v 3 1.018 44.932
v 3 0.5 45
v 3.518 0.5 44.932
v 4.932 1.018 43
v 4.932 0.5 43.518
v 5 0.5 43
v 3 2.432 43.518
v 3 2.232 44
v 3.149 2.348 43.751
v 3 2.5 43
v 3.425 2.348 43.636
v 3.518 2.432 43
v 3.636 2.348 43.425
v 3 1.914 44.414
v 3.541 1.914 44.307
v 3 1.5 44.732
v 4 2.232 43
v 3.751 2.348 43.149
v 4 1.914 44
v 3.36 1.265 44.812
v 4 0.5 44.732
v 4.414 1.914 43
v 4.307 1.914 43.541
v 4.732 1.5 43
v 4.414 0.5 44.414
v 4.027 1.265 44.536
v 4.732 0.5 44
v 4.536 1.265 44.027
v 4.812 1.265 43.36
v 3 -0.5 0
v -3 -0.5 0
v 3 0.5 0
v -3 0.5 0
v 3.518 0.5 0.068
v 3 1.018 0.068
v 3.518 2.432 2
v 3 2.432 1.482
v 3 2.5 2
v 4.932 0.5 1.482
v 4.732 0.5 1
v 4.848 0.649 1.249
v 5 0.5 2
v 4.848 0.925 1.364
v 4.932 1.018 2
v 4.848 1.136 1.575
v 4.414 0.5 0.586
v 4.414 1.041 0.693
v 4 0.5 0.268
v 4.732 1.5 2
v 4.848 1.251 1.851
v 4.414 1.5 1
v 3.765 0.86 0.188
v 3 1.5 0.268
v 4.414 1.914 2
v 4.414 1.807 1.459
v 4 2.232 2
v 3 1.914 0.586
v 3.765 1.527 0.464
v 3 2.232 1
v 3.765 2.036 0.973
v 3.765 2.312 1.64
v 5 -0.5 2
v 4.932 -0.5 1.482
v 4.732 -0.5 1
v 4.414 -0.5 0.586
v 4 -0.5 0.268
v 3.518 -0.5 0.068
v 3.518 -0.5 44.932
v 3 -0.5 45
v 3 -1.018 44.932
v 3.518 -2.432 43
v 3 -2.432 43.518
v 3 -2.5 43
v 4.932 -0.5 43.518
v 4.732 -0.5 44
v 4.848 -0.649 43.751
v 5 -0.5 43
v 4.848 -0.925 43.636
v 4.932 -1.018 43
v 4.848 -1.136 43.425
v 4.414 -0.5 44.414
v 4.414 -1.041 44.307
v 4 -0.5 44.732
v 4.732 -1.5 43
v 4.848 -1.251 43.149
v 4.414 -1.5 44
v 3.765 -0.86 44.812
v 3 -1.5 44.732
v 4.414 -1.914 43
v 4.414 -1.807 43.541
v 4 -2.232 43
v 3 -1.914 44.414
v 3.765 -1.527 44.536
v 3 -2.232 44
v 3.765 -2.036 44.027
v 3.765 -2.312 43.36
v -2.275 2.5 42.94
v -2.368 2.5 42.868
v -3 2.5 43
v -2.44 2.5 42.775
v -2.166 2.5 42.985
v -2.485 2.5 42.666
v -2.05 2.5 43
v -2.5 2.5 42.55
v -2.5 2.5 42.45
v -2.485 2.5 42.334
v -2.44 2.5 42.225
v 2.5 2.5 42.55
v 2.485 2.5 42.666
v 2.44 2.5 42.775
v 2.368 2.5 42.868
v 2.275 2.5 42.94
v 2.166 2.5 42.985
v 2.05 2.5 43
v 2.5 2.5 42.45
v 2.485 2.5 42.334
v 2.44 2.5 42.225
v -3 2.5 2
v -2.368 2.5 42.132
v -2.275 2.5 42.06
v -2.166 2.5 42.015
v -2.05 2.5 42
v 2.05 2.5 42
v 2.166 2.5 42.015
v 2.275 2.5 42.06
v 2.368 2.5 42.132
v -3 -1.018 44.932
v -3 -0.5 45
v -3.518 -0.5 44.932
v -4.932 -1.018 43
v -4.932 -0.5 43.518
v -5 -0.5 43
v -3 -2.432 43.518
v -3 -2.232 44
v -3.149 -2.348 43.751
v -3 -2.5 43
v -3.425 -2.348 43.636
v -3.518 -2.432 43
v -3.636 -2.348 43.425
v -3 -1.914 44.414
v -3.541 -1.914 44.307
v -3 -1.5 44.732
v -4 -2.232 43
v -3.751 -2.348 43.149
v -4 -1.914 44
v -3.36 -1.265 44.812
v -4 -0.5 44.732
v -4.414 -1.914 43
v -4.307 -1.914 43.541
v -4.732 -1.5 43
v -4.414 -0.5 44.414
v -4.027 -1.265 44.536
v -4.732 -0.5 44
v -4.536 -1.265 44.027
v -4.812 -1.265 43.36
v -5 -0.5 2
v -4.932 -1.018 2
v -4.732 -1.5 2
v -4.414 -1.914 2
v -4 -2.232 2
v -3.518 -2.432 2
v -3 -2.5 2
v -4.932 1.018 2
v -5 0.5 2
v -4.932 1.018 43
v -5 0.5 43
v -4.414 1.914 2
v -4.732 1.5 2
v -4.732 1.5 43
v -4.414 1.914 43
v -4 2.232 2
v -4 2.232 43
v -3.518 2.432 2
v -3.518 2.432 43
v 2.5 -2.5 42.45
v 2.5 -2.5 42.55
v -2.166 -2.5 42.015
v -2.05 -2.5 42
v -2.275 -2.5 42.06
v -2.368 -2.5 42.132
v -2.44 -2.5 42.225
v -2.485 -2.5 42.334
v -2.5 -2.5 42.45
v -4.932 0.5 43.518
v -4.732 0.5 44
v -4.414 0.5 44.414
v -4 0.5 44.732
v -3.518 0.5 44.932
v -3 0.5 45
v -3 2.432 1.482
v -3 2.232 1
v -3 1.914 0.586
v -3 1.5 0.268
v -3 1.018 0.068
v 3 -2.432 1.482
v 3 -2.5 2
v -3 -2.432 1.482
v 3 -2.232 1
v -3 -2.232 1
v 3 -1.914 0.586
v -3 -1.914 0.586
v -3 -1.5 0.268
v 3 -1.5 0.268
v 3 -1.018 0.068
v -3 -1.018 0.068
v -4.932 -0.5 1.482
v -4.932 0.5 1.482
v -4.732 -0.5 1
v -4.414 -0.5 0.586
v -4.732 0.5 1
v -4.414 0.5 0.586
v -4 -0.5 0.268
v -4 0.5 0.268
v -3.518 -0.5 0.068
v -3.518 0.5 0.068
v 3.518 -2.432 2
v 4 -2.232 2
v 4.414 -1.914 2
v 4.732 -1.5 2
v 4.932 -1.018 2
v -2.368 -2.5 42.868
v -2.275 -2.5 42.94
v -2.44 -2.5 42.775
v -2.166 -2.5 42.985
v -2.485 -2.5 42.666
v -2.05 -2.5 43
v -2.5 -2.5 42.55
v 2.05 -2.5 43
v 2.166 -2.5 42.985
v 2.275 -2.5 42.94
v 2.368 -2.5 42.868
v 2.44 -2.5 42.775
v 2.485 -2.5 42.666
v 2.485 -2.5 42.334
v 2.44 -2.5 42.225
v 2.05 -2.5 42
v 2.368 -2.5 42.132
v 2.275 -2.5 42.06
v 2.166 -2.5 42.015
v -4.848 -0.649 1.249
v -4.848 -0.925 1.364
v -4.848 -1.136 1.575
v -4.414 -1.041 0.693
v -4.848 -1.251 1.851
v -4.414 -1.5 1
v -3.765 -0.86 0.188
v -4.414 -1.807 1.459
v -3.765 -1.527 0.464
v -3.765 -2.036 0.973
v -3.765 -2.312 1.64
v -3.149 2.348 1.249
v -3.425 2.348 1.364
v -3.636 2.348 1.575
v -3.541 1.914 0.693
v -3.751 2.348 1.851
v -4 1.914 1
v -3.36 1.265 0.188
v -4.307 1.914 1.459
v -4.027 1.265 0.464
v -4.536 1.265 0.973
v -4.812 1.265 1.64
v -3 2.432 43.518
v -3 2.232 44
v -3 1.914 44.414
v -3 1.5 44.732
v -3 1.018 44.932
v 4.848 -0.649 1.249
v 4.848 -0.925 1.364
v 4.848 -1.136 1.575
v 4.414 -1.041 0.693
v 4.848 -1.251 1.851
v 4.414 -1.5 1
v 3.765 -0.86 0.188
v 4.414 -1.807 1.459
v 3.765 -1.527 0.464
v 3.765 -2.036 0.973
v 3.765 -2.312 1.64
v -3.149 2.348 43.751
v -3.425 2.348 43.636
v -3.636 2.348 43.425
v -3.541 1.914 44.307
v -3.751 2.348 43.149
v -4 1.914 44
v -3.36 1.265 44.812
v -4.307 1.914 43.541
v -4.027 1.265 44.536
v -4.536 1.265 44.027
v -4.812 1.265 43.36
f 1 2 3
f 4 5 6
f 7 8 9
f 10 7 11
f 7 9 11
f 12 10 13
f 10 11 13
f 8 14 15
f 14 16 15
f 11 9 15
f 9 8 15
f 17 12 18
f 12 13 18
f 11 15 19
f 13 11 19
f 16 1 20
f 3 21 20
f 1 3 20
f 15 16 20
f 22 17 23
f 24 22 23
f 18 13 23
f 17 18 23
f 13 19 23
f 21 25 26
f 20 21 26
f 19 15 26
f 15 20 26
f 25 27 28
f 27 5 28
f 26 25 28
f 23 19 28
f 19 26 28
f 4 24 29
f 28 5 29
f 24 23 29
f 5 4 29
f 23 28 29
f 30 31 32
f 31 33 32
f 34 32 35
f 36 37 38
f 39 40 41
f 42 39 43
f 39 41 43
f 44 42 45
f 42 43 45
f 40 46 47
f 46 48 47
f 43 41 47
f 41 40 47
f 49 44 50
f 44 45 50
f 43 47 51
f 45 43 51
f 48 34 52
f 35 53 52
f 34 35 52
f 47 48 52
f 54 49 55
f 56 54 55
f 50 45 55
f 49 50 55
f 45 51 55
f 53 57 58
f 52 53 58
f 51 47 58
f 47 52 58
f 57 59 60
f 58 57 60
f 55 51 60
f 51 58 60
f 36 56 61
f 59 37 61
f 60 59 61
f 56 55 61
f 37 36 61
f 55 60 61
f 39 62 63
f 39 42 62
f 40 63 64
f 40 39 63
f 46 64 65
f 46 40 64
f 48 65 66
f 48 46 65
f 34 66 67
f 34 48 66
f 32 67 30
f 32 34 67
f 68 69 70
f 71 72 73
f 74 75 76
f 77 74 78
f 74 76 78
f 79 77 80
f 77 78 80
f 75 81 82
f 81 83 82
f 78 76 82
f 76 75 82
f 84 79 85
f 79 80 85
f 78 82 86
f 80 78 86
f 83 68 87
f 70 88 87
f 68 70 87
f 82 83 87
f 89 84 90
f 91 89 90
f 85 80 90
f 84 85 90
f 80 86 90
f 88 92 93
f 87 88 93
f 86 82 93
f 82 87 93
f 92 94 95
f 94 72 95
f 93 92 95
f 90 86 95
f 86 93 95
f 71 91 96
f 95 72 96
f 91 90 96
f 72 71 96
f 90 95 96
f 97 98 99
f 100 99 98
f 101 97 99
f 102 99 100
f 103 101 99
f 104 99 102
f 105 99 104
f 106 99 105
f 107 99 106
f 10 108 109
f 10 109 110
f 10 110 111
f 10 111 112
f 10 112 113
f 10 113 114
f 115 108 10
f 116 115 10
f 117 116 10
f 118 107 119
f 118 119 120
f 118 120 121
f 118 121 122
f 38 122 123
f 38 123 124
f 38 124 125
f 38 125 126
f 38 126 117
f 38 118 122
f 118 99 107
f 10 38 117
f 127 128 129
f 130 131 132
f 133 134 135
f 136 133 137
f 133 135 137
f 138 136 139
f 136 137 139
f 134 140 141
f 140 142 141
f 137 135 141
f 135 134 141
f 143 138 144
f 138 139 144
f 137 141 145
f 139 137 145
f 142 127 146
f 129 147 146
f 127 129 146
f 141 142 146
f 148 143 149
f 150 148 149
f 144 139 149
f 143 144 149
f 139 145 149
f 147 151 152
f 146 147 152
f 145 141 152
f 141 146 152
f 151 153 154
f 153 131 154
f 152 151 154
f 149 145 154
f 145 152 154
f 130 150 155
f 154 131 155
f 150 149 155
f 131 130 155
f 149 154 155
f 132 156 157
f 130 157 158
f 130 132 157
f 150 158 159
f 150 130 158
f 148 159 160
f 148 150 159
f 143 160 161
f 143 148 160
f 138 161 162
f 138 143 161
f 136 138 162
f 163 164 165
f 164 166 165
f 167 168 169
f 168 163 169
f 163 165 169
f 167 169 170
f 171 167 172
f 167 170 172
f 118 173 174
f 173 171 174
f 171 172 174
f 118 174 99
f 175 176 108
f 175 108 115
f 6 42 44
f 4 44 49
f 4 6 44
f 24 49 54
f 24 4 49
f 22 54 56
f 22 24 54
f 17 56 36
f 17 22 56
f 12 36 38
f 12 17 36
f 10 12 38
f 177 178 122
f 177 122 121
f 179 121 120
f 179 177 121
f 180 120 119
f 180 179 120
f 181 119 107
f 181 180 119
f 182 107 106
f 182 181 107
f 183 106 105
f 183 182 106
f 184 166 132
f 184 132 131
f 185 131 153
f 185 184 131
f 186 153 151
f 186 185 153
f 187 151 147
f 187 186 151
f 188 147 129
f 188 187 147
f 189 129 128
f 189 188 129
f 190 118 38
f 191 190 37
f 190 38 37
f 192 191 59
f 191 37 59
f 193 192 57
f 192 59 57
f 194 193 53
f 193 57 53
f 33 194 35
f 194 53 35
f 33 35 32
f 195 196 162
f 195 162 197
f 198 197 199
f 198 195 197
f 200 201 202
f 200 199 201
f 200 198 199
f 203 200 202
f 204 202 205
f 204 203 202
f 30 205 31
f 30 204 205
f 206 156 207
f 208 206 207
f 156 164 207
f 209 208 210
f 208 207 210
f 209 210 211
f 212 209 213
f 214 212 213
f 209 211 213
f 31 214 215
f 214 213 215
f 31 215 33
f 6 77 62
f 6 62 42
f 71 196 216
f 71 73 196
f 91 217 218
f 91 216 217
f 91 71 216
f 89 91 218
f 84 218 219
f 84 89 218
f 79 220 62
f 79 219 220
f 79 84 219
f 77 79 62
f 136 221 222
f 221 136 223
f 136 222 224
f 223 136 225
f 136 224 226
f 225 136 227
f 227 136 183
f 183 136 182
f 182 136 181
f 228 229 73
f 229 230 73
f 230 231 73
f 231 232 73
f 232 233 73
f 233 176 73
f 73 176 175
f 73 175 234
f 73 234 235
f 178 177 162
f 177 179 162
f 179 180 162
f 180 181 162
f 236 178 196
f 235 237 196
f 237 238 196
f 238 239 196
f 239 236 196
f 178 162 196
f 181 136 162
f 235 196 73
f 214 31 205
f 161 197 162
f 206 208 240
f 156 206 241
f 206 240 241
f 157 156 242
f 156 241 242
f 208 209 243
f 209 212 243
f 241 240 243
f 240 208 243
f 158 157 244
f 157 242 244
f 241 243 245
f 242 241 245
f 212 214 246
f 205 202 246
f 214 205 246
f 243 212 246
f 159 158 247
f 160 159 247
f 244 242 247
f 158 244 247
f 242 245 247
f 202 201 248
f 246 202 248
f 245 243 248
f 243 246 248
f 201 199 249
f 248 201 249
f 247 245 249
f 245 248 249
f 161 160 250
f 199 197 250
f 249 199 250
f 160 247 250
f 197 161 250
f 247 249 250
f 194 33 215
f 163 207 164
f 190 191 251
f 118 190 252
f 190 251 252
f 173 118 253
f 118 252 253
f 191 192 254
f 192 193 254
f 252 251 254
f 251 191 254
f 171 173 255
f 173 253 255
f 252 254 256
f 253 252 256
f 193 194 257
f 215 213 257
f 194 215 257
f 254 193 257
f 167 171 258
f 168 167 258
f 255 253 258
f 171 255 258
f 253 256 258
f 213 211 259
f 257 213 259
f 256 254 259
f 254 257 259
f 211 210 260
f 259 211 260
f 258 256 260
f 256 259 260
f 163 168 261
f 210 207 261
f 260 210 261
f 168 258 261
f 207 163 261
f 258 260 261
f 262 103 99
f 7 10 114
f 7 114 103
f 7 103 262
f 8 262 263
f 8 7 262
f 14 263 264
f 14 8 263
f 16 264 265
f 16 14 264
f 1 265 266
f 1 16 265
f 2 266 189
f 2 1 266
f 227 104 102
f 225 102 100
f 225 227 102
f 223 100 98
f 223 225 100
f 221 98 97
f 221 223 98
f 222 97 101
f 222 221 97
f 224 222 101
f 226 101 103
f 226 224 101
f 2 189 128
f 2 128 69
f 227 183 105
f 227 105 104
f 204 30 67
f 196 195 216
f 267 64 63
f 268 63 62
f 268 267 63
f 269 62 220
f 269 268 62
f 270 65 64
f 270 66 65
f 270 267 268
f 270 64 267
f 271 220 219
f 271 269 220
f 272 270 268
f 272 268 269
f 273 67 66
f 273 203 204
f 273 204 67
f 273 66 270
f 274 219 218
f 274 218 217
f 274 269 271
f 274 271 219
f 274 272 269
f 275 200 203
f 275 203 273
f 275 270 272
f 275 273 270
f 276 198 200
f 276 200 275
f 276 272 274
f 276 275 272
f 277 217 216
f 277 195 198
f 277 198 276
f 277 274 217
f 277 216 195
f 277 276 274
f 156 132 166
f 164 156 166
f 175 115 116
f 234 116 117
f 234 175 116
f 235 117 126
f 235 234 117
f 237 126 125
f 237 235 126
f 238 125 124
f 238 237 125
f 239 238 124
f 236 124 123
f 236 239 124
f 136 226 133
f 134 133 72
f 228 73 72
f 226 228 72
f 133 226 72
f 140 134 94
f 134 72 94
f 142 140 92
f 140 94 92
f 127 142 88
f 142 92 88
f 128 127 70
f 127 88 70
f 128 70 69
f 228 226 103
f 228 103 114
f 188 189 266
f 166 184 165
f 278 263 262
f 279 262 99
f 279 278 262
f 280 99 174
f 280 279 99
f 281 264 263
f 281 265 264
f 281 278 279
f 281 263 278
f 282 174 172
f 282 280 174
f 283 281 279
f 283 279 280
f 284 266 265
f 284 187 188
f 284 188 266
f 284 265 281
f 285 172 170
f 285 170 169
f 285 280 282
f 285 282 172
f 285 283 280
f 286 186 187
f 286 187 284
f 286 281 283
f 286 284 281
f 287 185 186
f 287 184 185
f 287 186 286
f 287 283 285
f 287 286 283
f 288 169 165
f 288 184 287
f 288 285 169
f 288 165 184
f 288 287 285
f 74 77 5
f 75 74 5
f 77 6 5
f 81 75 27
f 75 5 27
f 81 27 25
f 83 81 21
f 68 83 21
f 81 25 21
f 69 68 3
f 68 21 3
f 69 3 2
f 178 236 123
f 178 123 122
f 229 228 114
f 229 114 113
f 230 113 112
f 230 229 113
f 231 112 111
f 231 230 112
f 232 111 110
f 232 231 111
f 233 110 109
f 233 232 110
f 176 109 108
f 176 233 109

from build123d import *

# Parameters (mm, degrees)
SKETCH1_W           = 10
SKETCH1_H           = 5
BOSS_EXTRUDE1_DEPTH = 45
FILLET1_R           = 2
CUT_EXTRUDE1_DEPTH  = 10


with BuildPart() as part:
    # Sketch1 → Boss-Extrude1 (new body)
    with BuildSketch(Plane.XY):
        Rectangle(SKETCH1_W, SKETCH1_H)
    extrude(amount=BOSS_EXTRUDE1_DEPTH)

    # Fillet1
    fillet1_edges = [part.edges().sort_by_distance(p)[0] for p in [
        (-5, 0, 45),
        (0, -2.5, 45),
        (5, 0, 45),
        (0, -2.5, 0),
        (-5, 0, 0),
        (0, 2.5, 0),
        (5, 0, 0),
        (0, 2.5, 45),
        (5, -2.5, 22.5),
        (-5, -2.5, 22.5),
        (-5, 2.5, 22.5),
        (5, 2.5, 22.5),
    ]]
    fillet(fillet1_edges, radius=FILLET1_R)

    # Sketch2 → Cut-Extrude1 (cut)
    with BuildSketch(Plane.XZ.offset(2.5)):
        with BuildLine():
            Line((2.05, 42), (-2.05, 42))
            ThreePointArc((-2.05, 42), (-2.368198052, 42.131801948), (-2.5, 42.45))
            Line((-2.5, 42.45), (-2.5, 42.55))
            ThreePointArc((-2.5, 42.55), (-2.368198052, 42.868198052), (-2.05, 43))
            Line((-2.05, 43), (2.05, 43))
            ThreePointArc((2.05, 43), (2.368198052, 42.868198052), (2.5, 42.55))
            Line((2.5, 42.55), (2.5, 42.45))
            ThreePointArc((2.5, 42.45), (2.368198052, 42.131801948), (2.05, 42))
        make_face()
    extrude(amount=-CUT_EXTRUDE1_DEPTH, mode=Mode.SUBTRACT)


solid = part.part
